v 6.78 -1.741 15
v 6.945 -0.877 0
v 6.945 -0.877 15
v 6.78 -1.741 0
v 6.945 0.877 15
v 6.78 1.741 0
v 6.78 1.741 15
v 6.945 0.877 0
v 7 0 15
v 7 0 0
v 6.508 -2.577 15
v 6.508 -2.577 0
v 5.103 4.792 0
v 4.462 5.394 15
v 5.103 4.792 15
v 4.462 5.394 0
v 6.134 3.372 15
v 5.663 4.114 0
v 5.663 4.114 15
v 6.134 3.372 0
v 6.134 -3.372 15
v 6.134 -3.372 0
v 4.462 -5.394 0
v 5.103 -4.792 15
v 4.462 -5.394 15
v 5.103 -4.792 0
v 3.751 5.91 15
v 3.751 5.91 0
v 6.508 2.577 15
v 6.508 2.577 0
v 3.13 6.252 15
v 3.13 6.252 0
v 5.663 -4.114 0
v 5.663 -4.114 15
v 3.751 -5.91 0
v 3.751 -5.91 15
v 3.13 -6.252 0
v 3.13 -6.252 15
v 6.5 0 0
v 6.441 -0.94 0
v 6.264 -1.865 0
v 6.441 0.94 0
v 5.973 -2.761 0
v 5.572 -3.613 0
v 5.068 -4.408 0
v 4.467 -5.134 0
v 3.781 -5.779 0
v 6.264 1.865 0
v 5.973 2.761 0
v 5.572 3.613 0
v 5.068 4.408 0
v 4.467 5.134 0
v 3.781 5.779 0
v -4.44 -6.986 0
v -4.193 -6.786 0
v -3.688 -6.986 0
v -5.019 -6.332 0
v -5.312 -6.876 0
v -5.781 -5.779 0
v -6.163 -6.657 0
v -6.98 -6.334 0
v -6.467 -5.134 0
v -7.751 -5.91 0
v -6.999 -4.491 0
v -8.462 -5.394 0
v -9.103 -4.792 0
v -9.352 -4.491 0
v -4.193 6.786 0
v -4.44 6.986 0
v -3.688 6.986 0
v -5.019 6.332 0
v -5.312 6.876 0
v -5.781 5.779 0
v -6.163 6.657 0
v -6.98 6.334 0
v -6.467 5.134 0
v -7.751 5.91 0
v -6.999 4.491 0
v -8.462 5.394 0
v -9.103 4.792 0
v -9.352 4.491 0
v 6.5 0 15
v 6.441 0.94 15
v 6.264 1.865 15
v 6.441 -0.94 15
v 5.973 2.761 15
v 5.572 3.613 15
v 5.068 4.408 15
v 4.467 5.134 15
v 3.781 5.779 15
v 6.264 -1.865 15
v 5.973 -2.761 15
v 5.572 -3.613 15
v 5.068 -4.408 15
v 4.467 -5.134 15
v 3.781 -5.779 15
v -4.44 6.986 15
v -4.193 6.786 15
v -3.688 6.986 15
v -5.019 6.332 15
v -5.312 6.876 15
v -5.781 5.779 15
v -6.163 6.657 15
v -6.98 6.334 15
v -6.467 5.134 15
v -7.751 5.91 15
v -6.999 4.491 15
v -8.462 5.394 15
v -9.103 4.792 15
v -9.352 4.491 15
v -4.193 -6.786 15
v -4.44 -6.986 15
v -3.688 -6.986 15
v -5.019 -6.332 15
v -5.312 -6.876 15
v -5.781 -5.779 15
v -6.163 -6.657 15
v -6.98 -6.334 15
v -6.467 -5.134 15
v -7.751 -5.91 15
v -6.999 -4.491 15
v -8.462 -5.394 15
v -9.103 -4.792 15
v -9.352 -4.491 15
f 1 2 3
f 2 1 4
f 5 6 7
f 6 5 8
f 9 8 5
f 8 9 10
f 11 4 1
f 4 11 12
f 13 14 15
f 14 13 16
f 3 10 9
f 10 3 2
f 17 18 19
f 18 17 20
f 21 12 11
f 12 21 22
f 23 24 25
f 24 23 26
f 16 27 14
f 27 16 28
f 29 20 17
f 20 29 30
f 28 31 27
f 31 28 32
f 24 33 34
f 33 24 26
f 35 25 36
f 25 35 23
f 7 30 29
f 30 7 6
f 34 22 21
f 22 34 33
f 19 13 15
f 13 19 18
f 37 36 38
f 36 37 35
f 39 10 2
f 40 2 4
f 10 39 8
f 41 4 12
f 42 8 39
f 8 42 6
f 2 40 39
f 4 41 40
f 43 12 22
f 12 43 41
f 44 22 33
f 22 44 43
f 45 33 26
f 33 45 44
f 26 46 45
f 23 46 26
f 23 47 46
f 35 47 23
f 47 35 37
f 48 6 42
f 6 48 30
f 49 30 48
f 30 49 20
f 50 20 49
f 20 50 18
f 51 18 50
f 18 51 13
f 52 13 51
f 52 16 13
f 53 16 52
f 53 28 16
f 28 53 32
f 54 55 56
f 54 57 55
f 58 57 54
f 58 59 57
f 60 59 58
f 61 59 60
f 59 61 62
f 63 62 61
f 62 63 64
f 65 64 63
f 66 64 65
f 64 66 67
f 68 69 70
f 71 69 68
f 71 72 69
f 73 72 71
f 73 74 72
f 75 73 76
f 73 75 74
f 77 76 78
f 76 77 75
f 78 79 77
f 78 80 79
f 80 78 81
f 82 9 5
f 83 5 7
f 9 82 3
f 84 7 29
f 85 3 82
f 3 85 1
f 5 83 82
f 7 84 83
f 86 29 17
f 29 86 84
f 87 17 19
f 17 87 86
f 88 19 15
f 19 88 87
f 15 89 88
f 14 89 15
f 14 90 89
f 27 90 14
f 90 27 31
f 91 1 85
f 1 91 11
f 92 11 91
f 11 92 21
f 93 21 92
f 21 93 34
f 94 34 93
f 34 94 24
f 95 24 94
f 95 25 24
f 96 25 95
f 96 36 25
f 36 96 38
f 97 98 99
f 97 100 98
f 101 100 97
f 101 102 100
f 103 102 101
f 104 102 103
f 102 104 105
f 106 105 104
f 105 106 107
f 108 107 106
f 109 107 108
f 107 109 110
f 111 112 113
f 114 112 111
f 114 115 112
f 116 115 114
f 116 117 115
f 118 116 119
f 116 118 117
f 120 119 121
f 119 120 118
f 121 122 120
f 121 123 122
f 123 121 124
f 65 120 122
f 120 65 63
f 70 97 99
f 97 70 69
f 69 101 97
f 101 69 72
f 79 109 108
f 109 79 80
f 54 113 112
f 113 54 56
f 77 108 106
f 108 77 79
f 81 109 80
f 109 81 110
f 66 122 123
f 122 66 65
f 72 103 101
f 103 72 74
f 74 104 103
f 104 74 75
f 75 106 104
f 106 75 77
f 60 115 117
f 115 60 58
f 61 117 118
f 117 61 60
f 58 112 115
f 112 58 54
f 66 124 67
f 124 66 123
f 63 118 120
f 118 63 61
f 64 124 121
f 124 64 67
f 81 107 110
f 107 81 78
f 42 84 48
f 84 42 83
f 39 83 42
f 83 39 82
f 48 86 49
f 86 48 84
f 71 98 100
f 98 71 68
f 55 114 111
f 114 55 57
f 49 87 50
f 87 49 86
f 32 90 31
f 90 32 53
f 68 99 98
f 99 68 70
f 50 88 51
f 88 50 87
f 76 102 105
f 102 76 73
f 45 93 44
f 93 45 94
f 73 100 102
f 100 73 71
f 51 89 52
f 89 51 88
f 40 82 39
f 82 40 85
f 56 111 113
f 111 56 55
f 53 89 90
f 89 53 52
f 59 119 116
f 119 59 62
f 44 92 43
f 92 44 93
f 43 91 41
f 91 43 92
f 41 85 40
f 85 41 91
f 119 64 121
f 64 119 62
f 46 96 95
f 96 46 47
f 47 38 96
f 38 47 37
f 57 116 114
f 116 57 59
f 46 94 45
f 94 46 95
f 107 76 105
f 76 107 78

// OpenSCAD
$fn = 50;


difference() {
	union() {
		cylinder(h = 15, r = 7.0000000000);
		translate(v = [-4.0000000000, 0, 0]) {
			cylinder(h = 15, r = 7.0000000000);
		}
	}
	union() {
		cylinder(h = 15, r = 3.2500000000);
		cylinder(h = 15, r = 1.8000000000);
		cylinder(h = 15, r = 1.8000000000);
		cylinder(h = 15, r = 1.8000000000);
		translate(v = [-8.5000000000, 0, 0]) {
			hull() {
				translate(v = [-3.7500000000, 0.0000000000, 0]) {
					cylinder(h = 15, r = 4.5000000000);
				}
				translate(v = [3.7500000000, 0.0000000000, 0]) {
					cylinder(h = 15, r = 4.5000000000);
				}
				translate(v = [-3.7500000000, -0.0000000000, 0]) {
					cylinder(h = 15, r = 4.5000000000);
				}
				translate(v = [3.7500000000, -0.0000000000, 0]) {
					cylinder(h = 15, r = 4.5000000000);
				}
			}
		}
		translate(v = [-1.0000000000, 0, 0.0000000000]) {
			cylinder(h = 15, r = 7.5000000000);
		}
	}
}
